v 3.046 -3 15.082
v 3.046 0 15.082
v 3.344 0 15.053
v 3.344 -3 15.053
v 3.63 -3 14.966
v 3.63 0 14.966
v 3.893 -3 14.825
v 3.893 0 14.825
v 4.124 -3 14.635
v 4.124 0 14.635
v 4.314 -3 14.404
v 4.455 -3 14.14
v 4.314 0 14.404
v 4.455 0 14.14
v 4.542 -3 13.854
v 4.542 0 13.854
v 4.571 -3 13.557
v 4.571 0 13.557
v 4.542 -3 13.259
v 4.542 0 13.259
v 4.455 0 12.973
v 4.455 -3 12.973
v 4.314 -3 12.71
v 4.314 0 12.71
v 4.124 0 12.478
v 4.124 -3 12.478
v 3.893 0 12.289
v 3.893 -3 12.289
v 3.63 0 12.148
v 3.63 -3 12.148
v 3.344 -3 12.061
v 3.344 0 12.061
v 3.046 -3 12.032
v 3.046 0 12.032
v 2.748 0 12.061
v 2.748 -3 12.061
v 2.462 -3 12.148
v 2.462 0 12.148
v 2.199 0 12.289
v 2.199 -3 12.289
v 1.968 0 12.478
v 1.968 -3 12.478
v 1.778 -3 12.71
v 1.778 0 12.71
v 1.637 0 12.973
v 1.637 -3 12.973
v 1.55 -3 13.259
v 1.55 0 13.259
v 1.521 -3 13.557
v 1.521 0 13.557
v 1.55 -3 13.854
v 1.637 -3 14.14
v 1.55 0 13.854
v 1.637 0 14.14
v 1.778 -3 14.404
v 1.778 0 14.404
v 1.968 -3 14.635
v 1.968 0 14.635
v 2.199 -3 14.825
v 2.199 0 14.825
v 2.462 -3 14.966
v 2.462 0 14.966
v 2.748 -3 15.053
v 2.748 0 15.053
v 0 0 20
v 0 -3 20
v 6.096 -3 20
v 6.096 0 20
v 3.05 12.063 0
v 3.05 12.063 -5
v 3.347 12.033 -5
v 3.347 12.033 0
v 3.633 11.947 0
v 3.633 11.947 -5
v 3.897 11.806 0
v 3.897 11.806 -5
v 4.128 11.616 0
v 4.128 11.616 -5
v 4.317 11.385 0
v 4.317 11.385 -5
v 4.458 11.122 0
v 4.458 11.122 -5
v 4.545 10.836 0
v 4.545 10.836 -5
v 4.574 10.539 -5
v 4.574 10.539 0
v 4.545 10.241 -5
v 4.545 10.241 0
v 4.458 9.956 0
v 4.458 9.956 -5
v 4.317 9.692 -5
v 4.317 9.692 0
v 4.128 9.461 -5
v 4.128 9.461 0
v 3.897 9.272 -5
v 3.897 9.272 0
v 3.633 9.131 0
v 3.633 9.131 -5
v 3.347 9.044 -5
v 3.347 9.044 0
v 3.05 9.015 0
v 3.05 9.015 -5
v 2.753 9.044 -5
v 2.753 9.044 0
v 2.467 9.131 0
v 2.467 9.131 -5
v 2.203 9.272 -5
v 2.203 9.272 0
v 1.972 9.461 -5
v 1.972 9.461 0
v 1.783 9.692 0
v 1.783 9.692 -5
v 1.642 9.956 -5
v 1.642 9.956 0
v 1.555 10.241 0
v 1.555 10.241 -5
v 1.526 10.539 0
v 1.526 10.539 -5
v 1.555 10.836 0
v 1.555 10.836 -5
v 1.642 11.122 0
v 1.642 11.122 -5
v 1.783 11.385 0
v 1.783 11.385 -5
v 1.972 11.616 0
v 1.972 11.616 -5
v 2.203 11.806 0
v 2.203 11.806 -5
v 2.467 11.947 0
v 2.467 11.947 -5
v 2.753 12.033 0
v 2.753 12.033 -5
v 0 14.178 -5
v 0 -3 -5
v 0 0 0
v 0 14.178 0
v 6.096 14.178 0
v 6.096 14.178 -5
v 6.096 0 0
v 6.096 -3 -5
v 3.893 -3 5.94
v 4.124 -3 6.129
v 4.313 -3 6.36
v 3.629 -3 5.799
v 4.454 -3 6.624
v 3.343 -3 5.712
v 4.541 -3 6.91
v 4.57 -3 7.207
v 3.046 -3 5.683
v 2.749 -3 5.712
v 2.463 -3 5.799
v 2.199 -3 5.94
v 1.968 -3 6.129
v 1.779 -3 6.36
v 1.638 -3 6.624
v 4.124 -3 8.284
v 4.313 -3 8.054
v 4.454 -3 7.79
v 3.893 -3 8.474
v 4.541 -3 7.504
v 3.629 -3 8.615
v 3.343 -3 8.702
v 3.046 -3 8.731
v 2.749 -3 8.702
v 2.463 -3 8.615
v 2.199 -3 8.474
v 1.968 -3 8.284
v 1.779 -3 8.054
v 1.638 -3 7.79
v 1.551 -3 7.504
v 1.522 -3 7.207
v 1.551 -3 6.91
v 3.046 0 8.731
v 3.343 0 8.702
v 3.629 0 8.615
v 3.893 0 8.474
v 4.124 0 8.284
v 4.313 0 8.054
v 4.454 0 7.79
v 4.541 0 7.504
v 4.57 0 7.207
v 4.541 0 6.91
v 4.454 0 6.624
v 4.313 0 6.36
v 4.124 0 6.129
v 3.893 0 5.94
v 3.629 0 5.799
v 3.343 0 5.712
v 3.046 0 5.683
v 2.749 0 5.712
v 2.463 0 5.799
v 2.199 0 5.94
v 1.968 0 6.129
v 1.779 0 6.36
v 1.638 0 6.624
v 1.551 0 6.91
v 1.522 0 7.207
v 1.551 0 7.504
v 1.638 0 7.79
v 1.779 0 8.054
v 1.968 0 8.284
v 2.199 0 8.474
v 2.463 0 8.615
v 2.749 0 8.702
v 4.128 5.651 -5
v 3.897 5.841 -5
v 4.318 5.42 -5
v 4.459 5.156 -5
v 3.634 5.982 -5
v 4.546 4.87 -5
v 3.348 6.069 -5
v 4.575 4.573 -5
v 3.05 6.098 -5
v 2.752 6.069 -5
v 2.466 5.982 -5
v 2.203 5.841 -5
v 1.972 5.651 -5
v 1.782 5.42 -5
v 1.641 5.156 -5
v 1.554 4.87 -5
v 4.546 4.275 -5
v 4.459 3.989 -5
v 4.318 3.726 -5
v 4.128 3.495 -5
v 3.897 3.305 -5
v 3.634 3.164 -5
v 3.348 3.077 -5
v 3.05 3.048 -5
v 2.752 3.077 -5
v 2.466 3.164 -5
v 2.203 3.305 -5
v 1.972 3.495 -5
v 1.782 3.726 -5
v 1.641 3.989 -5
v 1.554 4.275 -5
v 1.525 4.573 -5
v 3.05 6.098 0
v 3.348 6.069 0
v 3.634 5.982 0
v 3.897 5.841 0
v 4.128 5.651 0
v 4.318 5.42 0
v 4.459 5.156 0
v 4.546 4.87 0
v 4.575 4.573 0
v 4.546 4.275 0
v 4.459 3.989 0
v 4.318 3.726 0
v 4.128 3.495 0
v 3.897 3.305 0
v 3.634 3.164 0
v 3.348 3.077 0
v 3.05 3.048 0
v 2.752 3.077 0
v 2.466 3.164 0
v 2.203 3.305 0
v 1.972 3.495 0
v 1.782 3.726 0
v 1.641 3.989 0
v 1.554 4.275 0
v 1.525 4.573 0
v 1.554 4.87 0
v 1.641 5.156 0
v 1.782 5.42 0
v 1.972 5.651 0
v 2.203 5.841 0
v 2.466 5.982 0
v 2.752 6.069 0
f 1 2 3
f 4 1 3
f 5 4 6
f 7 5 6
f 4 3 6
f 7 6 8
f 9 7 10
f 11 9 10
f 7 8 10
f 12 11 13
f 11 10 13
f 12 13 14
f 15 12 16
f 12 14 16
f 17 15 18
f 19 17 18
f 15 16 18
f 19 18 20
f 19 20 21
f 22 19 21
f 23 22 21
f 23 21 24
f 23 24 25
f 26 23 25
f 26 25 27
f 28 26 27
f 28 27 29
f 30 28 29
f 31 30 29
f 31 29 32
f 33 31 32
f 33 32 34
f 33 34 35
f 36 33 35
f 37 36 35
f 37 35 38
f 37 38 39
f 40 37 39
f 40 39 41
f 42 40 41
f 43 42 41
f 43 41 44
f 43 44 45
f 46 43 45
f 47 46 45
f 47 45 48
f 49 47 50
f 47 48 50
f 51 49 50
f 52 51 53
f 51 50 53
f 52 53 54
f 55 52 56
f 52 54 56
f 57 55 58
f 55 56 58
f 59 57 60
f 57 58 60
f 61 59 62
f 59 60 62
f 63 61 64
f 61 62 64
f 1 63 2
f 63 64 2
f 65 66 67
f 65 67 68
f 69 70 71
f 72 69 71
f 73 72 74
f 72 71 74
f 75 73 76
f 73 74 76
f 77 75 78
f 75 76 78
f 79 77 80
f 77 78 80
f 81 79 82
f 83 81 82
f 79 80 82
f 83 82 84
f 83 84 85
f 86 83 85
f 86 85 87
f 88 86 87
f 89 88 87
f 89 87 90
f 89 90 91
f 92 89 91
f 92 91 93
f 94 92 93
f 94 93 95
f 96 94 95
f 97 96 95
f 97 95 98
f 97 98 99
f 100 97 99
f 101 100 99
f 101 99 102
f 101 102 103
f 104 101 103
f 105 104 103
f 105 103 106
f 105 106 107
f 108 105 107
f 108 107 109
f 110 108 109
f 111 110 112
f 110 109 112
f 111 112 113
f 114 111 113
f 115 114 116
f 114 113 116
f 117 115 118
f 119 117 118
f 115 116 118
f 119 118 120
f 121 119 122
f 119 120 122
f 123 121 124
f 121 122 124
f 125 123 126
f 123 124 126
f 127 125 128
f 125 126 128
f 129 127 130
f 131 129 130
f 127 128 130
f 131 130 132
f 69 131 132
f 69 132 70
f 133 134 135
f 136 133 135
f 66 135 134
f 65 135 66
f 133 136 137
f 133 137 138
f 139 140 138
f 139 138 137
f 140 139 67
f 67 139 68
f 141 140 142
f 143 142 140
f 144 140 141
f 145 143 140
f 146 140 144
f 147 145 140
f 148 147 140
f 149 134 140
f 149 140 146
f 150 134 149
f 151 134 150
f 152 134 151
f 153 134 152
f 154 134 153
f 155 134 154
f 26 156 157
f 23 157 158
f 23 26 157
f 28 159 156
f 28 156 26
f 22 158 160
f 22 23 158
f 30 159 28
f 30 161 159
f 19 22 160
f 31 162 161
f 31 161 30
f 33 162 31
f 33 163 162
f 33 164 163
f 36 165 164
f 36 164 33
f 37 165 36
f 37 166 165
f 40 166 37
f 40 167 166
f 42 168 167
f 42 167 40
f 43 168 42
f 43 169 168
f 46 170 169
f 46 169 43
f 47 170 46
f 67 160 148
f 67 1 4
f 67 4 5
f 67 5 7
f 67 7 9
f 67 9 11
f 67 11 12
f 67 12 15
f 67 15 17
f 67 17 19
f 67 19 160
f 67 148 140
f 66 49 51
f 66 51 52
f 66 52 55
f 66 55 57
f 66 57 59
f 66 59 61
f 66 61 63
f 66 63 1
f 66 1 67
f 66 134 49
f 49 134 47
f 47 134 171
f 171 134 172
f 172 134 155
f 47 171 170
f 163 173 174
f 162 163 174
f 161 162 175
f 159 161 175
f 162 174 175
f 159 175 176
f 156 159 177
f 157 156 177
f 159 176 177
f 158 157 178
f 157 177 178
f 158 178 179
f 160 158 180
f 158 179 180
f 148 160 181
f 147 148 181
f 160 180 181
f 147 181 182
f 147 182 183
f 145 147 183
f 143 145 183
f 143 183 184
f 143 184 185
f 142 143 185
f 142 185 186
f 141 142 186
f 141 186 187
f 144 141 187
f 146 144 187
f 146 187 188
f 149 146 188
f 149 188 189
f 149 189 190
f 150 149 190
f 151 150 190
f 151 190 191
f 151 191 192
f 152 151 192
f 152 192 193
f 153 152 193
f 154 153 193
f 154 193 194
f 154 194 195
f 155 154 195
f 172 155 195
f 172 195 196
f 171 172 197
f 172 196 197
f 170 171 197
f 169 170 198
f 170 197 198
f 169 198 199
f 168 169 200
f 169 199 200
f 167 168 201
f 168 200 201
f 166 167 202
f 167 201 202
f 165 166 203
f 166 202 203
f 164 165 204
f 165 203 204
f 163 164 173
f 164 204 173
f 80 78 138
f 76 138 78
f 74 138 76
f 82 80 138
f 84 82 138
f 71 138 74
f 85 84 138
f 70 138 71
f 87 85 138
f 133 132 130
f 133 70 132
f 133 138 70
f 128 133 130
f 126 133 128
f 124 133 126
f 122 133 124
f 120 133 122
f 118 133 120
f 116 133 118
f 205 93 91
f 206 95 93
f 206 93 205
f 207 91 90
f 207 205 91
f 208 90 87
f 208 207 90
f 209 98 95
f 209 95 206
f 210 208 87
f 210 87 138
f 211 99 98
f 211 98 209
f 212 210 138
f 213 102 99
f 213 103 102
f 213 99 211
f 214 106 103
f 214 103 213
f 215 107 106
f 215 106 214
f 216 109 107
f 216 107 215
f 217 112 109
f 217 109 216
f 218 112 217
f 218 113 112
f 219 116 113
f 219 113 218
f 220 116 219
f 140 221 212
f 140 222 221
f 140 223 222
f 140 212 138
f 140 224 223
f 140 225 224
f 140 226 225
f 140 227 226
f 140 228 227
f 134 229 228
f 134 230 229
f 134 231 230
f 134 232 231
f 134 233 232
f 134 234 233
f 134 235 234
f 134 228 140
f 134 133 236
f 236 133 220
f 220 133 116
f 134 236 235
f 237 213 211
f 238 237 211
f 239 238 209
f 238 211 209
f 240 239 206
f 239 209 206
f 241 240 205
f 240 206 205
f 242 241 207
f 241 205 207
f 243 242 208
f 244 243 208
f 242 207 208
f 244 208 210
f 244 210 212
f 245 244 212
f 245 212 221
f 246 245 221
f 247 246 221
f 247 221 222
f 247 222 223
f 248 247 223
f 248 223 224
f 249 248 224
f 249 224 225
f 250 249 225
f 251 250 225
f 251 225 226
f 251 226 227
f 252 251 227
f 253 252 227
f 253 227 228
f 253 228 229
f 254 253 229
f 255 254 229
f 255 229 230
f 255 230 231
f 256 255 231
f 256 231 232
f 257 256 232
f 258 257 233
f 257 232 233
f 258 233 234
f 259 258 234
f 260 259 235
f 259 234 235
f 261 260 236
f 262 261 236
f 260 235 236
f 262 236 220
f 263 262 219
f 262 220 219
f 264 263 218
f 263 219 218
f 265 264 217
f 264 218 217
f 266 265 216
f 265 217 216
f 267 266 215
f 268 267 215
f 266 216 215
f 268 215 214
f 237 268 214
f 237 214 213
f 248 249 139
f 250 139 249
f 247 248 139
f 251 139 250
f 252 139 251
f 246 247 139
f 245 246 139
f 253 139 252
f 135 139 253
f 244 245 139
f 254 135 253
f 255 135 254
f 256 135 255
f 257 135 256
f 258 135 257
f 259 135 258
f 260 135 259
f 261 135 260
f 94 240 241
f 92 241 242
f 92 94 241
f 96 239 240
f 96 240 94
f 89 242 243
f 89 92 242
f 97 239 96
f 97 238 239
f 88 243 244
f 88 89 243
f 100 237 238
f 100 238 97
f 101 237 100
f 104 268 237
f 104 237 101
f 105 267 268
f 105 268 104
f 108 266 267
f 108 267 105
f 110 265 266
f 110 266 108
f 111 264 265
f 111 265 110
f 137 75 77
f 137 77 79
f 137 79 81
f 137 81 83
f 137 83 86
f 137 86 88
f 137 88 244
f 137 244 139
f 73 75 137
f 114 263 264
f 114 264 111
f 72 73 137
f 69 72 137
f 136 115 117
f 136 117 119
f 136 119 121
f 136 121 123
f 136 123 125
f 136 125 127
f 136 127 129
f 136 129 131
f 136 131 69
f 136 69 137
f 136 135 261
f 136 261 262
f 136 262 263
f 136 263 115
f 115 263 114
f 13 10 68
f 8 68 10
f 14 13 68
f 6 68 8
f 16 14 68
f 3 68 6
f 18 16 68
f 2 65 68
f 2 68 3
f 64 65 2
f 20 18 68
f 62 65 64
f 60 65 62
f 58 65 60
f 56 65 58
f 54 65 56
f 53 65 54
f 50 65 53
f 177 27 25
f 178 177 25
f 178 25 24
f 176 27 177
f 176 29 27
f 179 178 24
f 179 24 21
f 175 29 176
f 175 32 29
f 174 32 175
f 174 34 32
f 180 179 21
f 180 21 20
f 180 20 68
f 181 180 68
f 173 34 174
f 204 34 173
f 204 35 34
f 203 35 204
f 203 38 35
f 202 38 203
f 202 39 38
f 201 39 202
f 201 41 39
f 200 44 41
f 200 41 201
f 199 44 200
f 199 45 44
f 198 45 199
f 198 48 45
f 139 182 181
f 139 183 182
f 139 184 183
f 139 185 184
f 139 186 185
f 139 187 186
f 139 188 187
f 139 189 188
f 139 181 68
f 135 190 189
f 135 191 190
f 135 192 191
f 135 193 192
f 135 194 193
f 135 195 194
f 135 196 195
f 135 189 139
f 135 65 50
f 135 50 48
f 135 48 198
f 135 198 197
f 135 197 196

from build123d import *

# Parameters (mm, degrees)
BOSS_EXTRUDE2_DEPTH = 6.096
SKETCH3_R           = 1.524
SKETCH3_R_2         = 1.525
CUT_EXTRUDE1_DEPTH  = 30.380027597
SKETCH4_R           = 1.524
SKETCH4_R_2         = 1.525
CUT_EXTRUDE3_DEPTH  = 26.262343945


with BuildPart() as part:
    # Sketch2 → Boss-Extrude2 (new body)
    with BuildSketch(Plane(origin=(0, 0, 0), x_dir=(0, 0, -1), z_dir=(1, 0, 0))):
        Polygon((0, 0), (0, 14.178321678), (5, 14.178321678), (5, -3), (-20, -3), (-20, 0), align=None)
    extrude(amount=BOSS_EXTRUDE2_DEPTH)

    # Sketch3 → Cut-Extrude1 (cut, through all)
    with BuildSketch(Plane(origin=(0, 0, -5), x_dir=(-1, 0, 0), z_dir=(0, 0, -1))):
        with Locations(Location((-3.05, 10.538720291, 0), (0, 0, 90))):
            Circle(SKETCH3_R)
        with Locations(Location((-3.05, 4.572872866, 0), (0, 0, 90))):
            Circle(SKETCH3_R_2)
    extrude(amount=-CUT_EXTRUDE1_DEPTH, mode=Mode.SUBTRACT)

    # Sketch4 → Cut-Extrude3 (cut, through all)
    with BuildSketch(Plane(origin=(0, 0, 0), x_dir=(1, 0, 0), z_dir=(0, 1, 0))):
        with Locations(Location((3.046, -7.206821765, 0), (0, 0, 270))):
            Circle(SKETCH4_R)
        with Locations(Location((3.046, -13.556821765, 0), (0, 0, 270))):
            Circle(SKETCH4_R_2)
    extrude(amount=-CUT_EXTRUDE3_DEPTH, mode=Mode.SUBTRACT)


solid = part.part
